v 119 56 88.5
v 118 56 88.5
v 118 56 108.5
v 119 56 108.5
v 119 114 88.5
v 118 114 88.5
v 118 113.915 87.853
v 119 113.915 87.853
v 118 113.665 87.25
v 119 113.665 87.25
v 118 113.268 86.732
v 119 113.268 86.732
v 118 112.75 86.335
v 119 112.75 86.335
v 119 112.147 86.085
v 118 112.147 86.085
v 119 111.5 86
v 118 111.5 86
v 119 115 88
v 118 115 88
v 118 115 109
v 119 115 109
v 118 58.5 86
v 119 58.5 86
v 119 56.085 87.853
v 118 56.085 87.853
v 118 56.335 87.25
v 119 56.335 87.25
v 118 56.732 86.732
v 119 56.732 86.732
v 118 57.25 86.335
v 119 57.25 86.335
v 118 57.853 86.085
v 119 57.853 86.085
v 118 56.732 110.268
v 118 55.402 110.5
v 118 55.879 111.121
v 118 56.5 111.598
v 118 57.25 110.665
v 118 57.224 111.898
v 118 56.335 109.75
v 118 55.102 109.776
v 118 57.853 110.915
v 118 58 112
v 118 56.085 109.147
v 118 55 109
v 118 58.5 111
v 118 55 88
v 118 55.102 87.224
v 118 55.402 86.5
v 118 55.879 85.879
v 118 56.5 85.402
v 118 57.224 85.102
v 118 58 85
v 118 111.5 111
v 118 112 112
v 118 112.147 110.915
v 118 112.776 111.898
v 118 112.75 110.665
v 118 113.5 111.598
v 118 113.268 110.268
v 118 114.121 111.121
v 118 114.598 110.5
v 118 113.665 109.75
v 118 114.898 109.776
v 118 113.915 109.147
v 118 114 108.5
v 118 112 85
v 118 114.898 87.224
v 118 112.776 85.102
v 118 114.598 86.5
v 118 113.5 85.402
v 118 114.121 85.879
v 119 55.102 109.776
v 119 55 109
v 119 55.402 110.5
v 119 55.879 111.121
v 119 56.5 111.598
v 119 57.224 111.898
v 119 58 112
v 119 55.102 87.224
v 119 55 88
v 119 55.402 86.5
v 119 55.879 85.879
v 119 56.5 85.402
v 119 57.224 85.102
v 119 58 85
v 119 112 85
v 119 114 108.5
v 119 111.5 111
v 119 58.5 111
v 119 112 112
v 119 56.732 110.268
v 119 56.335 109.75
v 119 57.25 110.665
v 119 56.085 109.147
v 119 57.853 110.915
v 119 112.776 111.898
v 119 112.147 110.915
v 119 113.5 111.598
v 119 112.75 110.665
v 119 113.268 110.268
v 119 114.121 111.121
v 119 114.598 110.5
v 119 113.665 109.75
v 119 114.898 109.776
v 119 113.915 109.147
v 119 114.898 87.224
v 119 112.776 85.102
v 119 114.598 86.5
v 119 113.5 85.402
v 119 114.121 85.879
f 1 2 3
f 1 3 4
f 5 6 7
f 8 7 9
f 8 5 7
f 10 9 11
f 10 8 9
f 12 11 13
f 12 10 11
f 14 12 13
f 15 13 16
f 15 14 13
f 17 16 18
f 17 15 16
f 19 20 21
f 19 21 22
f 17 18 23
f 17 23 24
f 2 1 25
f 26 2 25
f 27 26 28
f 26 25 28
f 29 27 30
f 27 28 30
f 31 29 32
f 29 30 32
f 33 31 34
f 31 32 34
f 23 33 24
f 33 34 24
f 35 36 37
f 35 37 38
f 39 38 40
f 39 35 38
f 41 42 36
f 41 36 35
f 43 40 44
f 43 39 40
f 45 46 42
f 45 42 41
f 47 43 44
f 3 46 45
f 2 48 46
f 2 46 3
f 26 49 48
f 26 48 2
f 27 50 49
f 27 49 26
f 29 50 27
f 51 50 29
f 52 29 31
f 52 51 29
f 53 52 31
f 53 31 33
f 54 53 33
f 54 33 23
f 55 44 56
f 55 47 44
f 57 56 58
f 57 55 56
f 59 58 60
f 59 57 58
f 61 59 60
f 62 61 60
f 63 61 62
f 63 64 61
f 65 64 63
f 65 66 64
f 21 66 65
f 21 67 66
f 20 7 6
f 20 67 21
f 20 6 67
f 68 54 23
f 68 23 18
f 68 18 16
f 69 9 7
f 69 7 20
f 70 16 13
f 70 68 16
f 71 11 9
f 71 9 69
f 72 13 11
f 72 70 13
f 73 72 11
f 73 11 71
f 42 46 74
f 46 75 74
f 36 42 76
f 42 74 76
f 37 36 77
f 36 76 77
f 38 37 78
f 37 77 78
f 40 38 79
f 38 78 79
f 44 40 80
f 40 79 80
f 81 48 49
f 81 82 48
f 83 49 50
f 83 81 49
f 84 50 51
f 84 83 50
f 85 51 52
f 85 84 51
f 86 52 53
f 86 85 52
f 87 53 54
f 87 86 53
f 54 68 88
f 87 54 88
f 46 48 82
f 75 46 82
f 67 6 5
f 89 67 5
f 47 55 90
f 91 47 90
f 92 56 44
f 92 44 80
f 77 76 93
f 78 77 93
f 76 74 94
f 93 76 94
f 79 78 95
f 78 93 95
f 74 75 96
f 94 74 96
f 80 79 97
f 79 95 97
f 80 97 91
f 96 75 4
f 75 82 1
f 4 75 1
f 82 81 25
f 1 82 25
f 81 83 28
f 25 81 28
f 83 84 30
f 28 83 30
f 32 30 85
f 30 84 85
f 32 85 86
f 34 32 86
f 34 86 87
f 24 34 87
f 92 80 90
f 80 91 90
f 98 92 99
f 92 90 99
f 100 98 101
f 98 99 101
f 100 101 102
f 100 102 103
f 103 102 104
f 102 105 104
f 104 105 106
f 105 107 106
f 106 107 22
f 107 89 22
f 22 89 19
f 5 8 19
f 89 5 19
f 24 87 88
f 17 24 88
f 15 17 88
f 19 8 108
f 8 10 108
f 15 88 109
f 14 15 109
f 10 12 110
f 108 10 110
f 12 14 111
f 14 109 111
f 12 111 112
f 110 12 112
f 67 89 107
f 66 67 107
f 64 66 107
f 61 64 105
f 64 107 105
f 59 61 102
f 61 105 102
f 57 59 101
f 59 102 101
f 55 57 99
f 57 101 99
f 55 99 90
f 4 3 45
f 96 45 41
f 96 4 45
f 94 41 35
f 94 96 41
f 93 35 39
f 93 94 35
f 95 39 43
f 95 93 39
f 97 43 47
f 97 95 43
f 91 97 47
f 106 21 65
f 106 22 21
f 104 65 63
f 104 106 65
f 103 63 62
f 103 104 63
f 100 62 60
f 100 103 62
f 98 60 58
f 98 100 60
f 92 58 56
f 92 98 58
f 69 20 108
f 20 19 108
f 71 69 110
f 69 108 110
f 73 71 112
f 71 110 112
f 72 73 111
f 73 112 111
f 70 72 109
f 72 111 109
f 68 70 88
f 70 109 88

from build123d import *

# Parameters (mm, degrees)
BOX056_W     = 5
BOX056_H     = 58
BOX056_DEPTH = 25
FILLET062_R  = 2.5
BOX007_W     = 1
BOX007_H     = 60
BOX007_DEPTH = 27
FILLET045_R  = 3


with BuildPart() as fillet062:
    # Box056 → Box056 (new body)
    with BuildSketch(Plane(origin=(118, 56, 86), x_dir=(1, 0, 0), z_dir=(0, 0, 1))):
        with Locations((2.5, 29)):
            Rectangle(BOX056_W, BOX056_H)
    extrude(amount=BOX056_DEPTH)

    # Fillet062
    fillet062_edges = [fillet062.edges().sort_by_distance(p)[0] for p in [
        (120.5, 56, 86),
        (120.5, 56, 111),
        (120.5, 114, 86),
        (120.5, 114, 111),
    ]]
    fillet(fillet062_edges, radius=FILLET062_R)


with BuildPart() as cut042:
    # Box007 → Box007 (new body)
    with BuildSketch(Plane(origin=(118, 55, 85), x_dir=(1, 0, 0), z_dir=(0, 0, 1))):
        with Locations((0.5, 30)):
            Rectangle(BOX007_W, BOX007_H)
    extrude(amount=BOX007_DEPTH)

    # Fillet045
    fillet045_edges = [cut042.edges().sort_by_distance(p)[0] for p in [
        (118.5, 55, 85),
        (118.5, 55, 112),
        (118.5, 115, 85),
        (118.5, 115, 112),
    ]]
    fillet(fillet045_edges, radius=FILLET045_R)

    # Cut042: cut Fillet062
    add(fillet062.part, mode=Mode.SUBTRACT)


solid = cut042.part
